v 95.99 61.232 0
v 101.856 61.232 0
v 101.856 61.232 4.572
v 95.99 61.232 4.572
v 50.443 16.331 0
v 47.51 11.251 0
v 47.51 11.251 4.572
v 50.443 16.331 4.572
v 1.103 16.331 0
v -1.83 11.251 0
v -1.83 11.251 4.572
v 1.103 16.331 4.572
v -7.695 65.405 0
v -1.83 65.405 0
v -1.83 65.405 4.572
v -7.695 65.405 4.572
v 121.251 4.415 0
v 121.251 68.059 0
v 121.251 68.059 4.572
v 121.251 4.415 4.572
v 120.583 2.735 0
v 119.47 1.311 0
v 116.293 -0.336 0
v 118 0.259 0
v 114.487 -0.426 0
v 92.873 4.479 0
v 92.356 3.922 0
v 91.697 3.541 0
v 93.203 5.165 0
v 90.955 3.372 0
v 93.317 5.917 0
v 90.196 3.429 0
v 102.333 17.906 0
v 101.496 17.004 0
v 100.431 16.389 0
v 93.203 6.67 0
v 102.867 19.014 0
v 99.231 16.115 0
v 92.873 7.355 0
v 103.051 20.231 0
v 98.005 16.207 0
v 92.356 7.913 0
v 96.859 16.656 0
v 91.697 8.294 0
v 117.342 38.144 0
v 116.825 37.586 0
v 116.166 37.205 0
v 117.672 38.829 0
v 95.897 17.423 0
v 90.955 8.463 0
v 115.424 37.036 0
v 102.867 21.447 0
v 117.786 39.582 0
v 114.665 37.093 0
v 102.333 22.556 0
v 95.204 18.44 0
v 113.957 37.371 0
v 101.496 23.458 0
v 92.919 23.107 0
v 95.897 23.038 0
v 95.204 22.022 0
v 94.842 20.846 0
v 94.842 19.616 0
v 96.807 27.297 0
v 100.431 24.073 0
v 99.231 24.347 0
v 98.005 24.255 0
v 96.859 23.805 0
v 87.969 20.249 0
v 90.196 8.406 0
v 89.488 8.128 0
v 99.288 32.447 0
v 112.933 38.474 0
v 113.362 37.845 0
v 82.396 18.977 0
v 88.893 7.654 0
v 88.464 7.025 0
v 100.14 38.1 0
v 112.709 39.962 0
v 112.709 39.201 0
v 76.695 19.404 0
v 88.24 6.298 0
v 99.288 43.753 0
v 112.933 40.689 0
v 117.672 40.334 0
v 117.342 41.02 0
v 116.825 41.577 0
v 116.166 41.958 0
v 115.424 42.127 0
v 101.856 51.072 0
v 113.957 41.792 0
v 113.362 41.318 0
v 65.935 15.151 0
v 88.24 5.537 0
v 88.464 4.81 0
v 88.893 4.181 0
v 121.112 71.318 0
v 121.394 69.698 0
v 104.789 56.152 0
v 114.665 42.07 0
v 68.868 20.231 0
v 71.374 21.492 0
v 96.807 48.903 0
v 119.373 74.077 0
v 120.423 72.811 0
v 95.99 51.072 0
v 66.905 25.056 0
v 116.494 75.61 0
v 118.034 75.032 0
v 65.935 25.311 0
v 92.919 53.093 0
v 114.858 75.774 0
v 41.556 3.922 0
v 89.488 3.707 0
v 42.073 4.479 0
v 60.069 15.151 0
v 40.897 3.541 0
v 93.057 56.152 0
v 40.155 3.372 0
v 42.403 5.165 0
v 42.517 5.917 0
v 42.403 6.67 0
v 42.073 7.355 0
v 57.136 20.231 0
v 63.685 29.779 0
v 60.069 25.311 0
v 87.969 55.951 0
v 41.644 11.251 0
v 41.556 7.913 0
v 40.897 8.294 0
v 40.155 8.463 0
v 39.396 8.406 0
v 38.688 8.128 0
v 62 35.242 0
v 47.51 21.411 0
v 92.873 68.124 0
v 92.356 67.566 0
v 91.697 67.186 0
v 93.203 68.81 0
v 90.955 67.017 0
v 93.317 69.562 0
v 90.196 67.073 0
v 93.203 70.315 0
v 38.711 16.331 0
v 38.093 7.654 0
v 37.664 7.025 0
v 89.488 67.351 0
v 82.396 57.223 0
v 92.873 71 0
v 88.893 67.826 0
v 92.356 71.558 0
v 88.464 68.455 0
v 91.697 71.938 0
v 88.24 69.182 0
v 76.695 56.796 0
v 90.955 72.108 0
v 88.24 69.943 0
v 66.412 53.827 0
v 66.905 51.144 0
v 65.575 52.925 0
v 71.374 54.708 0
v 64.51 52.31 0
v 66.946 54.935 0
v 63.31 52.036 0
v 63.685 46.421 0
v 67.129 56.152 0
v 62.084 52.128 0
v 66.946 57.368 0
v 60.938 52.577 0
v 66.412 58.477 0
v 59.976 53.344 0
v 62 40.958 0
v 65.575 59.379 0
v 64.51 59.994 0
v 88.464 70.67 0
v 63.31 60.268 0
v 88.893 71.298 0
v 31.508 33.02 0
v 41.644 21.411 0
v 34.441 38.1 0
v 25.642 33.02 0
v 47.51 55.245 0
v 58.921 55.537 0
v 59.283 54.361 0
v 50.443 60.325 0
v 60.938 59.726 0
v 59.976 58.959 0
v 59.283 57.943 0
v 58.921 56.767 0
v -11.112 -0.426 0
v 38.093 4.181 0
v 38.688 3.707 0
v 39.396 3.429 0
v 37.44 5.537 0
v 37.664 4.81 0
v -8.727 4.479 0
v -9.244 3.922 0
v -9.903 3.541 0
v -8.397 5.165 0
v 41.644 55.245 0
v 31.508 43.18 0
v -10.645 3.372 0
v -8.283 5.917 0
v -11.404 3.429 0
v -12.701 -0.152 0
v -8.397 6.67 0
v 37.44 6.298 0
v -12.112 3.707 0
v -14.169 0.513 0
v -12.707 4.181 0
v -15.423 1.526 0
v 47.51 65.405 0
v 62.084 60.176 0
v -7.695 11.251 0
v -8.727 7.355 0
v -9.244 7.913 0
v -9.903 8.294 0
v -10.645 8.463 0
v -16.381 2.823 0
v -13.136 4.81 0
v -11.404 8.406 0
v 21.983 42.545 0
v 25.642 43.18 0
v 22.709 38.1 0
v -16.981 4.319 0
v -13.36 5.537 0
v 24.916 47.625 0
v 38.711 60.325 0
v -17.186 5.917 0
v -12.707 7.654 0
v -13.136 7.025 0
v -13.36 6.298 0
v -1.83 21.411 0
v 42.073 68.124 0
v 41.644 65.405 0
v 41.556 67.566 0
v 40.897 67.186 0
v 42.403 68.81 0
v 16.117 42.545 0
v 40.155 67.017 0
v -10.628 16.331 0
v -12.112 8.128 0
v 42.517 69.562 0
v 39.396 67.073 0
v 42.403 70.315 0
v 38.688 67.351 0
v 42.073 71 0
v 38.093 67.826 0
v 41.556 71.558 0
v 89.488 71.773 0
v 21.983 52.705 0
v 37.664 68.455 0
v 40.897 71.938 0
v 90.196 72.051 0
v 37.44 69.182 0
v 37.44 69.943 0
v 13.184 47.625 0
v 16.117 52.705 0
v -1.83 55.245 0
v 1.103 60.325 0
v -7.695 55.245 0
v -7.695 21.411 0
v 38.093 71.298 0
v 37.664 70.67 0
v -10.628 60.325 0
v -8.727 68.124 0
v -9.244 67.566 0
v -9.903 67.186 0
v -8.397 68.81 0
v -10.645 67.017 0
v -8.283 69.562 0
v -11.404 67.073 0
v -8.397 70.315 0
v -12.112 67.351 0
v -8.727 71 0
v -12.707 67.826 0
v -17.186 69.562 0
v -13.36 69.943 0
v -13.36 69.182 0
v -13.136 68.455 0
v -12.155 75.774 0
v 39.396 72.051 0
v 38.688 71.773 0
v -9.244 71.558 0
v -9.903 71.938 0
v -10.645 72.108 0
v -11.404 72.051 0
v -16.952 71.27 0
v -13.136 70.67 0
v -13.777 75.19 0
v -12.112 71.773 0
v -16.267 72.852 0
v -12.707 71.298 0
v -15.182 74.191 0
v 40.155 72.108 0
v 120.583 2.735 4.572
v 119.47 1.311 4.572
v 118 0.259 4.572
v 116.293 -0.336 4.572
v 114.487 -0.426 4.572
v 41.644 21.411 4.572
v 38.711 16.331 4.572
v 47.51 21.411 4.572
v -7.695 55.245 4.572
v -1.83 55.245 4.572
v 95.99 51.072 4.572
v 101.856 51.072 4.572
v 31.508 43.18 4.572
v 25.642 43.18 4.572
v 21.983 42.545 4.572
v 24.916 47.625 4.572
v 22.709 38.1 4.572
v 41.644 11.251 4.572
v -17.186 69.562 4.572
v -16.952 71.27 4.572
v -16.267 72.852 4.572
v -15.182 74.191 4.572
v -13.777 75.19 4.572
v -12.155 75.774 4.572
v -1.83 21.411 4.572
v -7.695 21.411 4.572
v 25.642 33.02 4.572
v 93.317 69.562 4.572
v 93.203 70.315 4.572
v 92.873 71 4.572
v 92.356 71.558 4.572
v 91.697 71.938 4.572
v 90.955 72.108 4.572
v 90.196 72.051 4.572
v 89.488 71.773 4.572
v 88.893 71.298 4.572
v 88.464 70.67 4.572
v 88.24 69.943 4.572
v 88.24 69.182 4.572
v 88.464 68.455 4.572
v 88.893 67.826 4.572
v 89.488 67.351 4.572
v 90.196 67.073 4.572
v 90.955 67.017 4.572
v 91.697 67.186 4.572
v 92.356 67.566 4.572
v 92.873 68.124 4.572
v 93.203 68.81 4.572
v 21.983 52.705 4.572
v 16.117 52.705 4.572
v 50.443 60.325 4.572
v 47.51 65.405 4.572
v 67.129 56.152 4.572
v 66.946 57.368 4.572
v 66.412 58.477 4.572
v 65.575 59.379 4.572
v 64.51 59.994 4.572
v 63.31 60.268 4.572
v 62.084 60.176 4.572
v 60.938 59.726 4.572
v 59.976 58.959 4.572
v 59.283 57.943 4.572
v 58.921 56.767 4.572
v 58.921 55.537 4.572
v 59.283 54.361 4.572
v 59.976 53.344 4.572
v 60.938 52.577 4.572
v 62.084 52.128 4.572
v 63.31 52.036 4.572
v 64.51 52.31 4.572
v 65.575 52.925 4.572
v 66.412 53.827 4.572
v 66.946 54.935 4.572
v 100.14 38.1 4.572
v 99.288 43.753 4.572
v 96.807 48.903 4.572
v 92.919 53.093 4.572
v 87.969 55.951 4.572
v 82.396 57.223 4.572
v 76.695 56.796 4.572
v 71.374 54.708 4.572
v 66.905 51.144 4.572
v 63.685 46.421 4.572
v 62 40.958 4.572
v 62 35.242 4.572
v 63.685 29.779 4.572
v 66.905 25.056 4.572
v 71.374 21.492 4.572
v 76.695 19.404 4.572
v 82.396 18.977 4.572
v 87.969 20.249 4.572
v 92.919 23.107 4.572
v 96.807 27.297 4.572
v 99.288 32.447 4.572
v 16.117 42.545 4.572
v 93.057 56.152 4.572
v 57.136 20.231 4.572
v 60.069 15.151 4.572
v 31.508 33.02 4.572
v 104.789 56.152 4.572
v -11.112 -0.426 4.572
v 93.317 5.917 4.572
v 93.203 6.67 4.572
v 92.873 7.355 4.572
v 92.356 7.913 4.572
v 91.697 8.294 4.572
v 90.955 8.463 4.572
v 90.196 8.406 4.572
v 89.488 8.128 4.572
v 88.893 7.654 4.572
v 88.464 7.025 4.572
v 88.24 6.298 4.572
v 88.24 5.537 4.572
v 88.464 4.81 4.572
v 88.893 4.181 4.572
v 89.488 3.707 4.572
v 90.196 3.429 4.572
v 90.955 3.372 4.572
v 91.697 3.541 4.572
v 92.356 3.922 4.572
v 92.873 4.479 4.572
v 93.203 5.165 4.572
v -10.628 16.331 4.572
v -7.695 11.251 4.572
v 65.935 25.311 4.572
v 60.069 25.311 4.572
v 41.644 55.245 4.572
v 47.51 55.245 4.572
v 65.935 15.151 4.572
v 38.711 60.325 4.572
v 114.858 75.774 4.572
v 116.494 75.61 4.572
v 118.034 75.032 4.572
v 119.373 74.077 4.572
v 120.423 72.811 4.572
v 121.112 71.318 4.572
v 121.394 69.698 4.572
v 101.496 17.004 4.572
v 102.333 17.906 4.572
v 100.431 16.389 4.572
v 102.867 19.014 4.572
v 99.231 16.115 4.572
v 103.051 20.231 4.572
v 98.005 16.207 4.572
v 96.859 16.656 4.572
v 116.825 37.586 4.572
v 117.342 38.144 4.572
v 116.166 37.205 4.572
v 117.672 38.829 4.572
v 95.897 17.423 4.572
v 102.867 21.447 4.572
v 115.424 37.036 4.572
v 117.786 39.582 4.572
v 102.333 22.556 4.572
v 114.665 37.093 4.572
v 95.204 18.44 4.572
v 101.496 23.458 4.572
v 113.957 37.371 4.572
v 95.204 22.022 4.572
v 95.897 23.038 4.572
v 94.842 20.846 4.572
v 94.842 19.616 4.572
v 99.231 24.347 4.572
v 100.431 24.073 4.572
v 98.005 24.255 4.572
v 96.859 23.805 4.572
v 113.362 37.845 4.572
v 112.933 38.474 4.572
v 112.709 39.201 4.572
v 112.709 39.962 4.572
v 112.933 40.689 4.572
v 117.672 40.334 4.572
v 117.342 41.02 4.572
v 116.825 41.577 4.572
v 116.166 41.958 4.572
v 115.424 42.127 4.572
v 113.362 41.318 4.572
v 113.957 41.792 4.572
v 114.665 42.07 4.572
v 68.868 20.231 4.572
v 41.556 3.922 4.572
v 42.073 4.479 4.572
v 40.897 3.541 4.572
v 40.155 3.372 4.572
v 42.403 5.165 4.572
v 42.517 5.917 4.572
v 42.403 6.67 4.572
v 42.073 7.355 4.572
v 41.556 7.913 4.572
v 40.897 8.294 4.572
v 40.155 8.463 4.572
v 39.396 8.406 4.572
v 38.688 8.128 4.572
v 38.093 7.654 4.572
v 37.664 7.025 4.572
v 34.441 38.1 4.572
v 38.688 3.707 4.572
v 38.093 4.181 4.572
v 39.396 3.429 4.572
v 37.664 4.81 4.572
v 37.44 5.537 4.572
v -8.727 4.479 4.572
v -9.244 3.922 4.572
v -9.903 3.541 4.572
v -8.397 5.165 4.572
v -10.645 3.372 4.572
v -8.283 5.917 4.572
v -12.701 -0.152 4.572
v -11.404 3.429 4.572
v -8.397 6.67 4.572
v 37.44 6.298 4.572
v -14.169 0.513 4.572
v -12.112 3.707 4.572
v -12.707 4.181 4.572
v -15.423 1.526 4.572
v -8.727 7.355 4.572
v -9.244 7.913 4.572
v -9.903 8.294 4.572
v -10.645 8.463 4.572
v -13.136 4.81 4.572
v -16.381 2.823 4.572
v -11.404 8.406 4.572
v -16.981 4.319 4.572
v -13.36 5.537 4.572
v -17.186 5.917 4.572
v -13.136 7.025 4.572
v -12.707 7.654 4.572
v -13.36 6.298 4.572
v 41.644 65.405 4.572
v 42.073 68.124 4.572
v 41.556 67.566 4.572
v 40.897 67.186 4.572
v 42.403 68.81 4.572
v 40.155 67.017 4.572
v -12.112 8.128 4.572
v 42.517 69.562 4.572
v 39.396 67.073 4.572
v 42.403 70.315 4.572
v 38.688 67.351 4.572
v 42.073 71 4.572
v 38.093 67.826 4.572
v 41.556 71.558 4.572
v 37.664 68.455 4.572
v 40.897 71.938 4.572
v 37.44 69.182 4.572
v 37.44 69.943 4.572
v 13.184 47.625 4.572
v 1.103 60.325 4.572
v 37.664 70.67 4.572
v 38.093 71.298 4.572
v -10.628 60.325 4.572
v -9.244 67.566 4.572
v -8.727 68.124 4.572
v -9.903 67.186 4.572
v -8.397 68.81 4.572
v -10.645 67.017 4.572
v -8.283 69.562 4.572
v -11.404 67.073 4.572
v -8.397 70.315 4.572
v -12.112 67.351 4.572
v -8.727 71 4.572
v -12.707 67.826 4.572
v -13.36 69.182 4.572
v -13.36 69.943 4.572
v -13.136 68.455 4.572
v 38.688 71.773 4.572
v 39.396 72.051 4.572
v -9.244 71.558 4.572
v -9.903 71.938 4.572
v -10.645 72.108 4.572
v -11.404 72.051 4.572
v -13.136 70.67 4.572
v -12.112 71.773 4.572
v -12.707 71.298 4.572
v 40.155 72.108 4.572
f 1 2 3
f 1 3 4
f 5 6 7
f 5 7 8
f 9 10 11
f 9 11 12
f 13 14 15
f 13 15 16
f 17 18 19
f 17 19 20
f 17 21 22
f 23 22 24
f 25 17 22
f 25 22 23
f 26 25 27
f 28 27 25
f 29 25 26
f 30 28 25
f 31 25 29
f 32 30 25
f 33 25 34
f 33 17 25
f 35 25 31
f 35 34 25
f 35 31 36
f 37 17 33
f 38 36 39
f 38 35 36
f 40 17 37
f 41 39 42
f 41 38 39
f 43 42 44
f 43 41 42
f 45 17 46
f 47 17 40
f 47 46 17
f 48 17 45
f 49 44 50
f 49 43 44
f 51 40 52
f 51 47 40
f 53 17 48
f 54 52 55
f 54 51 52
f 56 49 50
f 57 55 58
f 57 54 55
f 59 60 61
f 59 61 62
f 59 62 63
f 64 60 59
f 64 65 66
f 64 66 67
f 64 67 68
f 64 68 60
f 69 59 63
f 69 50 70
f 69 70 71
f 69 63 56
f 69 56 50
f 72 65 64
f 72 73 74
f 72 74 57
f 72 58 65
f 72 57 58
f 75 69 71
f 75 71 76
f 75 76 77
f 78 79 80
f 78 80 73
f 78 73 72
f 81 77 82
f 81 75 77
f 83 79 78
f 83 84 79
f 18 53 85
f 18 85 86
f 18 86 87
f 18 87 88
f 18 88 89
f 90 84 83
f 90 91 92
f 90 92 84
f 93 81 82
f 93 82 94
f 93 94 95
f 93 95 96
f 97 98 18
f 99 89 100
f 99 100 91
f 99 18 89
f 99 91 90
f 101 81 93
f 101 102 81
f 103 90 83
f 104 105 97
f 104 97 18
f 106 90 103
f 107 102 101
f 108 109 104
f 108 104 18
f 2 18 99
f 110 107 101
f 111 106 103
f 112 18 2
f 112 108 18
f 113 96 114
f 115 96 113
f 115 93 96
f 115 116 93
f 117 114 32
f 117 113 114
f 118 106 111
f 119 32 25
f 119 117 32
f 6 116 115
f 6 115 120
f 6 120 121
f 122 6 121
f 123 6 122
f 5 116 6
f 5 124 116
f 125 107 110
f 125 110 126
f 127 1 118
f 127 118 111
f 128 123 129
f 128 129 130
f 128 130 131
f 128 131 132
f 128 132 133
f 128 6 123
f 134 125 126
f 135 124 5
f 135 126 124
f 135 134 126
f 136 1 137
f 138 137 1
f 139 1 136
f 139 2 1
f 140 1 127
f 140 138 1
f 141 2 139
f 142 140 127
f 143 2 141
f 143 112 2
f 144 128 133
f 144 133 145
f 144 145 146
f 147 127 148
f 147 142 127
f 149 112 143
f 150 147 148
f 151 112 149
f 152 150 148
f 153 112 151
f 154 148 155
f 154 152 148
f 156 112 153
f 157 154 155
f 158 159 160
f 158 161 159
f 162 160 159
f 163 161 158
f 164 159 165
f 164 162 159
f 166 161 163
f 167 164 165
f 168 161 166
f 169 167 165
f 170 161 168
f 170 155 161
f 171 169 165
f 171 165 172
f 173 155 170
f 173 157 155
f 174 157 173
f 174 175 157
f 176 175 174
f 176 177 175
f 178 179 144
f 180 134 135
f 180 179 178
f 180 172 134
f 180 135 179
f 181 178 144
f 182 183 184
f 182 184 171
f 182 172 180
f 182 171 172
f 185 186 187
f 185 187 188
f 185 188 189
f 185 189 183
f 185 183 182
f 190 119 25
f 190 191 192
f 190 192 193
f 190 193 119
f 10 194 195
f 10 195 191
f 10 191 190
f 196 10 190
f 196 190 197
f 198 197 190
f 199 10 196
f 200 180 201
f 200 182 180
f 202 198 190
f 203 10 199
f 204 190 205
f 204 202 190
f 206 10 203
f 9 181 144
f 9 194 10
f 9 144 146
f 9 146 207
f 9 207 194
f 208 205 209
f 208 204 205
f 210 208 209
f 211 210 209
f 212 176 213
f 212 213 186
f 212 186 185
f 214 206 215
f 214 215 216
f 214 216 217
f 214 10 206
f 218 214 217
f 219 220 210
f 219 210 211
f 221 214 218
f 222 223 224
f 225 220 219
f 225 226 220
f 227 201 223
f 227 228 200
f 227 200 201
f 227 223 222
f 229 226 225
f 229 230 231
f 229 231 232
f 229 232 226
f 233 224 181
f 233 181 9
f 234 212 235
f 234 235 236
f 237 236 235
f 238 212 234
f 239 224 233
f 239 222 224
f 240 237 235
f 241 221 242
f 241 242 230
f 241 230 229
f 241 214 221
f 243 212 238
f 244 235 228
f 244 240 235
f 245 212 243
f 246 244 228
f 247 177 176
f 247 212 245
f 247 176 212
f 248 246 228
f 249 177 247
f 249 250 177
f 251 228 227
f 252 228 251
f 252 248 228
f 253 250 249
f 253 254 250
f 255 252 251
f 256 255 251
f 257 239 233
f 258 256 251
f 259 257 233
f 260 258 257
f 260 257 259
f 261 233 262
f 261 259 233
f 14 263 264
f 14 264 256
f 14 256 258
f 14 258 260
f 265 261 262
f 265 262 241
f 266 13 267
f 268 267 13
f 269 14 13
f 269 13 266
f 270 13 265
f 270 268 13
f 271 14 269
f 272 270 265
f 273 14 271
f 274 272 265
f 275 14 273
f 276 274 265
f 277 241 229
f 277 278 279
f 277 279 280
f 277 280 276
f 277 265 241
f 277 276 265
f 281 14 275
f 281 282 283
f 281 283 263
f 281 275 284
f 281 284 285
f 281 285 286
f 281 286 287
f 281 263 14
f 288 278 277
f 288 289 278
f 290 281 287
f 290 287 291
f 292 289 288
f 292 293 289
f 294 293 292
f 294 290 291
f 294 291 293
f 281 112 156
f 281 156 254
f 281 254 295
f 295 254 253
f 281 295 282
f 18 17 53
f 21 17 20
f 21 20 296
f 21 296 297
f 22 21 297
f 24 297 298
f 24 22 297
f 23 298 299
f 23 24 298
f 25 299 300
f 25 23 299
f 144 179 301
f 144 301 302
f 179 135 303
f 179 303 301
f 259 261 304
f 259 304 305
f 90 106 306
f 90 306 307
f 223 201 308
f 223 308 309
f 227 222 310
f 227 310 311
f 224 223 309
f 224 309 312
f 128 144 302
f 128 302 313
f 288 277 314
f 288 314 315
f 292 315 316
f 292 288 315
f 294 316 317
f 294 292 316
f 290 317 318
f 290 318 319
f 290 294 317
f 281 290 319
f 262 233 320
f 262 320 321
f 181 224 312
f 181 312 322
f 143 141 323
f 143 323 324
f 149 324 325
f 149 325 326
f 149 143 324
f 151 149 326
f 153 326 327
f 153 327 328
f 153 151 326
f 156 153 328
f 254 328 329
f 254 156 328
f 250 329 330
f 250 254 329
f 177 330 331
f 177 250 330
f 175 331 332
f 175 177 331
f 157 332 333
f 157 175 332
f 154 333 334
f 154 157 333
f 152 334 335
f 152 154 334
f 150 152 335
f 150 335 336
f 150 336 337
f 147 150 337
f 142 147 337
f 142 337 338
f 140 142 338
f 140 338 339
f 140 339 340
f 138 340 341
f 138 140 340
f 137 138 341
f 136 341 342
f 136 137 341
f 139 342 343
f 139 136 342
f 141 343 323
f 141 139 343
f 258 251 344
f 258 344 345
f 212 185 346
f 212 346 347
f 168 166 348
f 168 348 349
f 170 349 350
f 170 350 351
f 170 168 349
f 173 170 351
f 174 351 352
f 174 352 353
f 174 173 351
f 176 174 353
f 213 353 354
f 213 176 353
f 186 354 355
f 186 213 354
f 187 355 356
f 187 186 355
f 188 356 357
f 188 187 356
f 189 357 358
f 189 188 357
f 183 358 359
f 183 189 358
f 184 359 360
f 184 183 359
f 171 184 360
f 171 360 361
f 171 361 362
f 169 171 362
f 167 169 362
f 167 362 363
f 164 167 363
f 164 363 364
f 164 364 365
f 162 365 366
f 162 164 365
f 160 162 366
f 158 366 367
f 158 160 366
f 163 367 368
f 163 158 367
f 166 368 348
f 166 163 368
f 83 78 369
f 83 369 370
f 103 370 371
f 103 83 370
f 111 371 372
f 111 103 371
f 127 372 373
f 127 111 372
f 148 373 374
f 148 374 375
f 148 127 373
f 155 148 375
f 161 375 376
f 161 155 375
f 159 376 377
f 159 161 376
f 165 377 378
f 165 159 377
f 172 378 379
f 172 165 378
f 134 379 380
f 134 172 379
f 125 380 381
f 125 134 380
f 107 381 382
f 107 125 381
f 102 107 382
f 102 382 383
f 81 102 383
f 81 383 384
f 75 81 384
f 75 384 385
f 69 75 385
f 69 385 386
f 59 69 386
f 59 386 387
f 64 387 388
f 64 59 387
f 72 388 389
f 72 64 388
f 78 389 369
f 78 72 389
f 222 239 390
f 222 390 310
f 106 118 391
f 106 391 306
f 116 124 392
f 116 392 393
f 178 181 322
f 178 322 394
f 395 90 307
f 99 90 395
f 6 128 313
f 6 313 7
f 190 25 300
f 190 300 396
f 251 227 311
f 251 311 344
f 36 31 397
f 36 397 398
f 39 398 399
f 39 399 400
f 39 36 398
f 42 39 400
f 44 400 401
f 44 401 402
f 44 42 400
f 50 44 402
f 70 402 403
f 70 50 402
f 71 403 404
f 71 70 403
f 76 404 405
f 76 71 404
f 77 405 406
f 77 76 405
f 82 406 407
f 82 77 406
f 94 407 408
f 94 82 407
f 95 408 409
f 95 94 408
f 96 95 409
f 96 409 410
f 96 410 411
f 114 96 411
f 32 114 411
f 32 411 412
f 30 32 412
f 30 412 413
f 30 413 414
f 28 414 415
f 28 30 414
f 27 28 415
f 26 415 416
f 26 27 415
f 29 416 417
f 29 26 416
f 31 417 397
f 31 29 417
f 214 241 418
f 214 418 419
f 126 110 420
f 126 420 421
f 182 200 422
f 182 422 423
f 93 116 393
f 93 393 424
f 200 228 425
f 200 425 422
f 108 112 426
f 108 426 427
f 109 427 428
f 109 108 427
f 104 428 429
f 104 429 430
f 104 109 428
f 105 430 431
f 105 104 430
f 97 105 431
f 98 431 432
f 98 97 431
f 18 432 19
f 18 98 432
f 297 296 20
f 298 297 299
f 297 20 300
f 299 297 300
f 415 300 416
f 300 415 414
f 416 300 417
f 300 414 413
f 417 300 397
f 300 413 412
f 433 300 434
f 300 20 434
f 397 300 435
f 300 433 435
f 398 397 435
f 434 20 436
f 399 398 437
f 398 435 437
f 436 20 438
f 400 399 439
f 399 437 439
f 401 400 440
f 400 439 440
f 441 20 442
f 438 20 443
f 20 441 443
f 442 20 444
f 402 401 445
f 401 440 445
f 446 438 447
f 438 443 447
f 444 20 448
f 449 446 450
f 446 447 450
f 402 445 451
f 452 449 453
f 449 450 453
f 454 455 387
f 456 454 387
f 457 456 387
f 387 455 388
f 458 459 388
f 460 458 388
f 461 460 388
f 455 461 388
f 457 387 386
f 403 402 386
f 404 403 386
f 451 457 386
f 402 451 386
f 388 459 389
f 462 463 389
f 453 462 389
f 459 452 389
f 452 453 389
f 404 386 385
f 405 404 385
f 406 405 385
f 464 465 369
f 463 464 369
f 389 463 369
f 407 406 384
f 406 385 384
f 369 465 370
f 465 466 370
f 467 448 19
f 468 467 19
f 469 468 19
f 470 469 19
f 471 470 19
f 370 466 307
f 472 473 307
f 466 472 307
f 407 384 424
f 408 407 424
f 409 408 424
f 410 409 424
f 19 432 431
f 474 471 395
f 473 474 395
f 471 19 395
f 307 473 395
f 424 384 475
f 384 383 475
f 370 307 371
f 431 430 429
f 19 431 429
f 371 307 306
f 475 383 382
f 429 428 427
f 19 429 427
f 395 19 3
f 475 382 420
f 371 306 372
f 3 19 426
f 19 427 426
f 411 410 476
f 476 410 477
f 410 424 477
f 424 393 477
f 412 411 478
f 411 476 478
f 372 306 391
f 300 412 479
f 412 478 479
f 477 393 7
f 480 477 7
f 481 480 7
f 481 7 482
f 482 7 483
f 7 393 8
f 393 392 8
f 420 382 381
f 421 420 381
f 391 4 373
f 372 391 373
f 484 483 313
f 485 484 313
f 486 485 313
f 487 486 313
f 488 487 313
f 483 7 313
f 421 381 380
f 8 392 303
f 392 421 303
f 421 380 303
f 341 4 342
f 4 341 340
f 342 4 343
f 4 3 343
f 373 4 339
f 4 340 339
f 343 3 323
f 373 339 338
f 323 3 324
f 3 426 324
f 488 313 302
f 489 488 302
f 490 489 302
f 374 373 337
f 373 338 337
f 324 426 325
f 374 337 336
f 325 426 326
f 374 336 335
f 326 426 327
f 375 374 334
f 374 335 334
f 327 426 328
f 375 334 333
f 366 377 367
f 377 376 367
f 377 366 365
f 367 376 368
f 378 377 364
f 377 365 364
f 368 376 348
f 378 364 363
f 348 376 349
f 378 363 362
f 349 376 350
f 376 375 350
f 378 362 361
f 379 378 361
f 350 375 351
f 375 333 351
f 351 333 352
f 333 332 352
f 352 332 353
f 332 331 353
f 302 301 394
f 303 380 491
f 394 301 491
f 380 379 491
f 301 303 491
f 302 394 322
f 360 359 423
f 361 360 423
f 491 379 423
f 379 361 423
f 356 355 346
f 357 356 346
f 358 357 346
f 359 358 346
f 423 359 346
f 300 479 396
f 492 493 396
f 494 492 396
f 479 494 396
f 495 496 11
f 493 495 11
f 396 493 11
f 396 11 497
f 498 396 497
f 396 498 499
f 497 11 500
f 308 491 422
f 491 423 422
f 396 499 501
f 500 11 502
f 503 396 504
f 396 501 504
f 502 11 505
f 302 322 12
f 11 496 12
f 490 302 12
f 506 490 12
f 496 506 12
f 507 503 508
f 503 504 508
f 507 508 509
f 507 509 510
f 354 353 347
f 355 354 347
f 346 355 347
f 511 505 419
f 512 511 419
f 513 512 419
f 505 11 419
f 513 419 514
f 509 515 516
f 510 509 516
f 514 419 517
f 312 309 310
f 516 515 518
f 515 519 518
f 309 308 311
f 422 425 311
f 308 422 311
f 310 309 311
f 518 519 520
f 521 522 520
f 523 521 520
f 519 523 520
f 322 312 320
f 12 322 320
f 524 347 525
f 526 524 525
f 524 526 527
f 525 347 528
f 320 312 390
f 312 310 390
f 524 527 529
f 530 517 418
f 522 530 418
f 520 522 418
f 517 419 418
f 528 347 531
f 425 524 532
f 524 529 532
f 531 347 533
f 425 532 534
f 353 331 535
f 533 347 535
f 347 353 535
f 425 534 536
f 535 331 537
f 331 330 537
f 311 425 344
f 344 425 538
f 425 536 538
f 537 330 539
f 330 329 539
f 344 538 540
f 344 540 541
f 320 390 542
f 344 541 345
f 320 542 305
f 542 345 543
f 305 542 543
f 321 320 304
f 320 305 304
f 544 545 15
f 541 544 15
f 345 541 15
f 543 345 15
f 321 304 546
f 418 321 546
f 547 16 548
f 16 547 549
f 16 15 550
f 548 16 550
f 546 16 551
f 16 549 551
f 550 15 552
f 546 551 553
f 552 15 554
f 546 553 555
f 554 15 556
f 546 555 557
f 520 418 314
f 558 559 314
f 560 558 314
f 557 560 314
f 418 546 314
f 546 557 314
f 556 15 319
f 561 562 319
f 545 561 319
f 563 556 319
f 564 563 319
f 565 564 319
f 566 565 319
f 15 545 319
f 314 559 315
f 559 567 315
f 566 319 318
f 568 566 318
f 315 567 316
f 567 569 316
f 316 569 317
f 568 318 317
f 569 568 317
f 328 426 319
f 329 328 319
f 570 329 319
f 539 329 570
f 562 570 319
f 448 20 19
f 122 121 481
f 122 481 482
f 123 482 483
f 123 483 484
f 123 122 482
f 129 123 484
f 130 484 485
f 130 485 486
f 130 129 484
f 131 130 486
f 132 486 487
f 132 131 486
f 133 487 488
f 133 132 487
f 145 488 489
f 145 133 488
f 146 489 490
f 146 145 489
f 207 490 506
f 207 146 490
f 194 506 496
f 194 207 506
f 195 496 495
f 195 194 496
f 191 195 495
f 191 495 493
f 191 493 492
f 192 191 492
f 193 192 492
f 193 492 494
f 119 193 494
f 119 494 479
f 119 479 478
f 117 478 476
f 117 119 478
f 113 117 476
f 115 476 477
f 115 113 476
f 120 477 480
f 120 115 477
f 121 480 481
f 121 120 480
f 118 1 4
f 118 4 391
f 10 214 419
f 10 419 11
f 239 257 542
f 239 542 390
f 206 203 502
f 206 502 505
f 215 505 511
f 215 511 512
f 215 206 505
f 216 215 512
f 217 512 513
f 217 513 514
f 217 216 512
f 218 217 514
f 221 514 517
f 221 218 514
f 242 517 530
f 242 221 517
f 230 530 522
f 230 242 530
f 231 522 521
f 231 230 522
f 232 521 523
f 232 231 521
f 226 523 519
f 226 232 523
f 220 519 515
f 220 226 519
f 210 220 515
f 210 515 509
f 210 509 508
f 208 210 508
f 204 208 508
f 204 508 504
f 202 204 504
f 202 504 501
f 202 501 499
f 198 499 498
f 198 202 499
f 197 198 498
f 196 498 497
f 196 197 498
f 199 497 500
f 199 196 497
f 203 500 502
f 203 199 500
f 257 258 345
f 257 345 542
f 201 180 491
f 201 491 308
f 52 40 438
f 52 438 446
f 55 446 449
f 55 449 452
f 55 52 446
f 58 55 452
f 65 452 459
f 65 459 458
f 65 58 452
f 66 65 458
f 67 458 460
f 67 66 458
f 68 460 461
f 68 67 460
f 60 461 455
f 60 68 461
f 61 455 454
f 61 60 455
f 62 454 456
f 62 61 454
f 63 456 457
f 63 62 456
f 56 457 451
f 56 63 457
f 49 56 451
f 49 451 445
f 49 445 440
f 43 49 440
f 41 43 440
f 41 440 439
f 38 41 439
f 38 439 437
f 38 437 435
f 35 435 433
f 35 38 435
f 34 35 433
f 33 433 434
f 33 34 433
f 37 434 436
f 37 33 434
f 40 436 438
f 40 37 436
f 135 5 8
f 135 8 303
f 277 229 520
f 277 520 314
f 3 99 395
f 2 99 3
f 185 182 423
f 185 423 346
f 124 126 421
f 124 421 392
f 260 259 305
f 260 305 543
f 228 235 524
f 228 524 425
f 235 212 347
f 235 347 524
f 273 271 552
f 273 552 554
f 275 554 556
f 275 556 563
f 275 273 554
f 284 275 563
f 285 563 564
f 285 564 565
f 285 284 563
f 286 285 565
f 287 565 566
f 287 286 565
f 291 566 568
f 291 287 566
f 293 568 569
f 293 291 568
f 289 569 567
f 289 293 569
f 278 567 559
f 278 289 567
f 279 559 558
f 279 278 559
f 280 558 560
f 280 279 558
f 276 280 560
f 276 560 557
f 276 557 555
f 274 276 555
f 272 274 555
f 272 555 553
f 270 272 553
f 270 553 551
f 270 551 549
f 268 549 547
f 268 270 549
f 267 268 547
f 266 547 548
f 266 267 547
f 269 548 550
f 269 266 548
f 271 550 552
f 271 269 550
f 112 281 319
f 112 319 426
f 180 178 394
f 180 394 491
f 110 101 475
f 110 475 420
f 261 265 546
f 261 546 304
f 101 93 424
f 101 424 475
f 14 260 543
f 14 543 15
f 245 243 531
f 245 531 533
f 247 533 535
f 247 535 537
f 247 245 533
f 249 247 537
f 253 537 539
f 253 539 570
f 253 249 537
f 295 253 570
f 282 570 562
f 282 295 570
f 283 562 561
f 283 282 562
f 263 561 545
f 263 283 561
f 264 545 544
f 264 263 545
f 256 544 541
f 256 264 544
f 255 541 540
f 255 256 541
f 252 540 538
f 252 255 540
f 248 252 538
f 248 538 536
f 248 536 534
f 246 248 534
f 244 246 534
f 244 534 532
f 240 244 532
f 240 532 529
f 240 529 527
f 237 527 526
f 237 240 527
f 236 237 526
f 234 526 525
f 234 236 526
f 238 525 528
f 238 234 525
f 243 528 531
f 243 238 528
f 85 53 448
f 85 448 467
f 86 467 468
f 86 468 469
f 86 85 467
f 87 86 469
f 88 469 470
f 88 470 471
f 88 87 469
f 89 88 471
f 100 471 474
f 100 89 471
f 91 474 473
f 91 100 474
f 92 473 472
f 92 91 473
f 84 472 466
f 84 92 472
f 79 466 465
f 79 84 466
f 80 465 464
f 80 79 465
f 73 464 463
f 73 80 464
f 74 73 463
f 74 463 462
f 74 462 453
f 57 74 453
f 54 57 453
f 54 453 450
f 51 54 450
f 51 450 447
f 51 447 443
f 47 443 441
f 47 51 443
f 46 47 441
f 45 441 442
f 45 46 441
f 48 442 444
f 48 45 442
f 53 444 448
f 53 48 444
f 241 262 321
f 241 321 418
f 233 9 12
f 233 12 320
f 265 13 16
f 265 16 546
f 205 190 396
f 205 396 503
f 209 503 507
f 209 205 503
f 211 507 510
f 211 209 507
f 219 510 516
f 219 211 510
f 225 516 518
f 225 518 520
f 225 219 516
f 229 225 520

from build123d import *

# Parameters (mm, degrees)
SKETCH1_R           = 2.5527
SKETCH1_R_2         = 4.1275
SKETCH1_R_3         = 19.177
BOSS_EXTRUDE1_DEPTH = 4.572


with BuildPart() as part:
    # Sketch1 → Boss-Extrude1 (new body)
    with BuildSketch(Plane.XY):
        with BuildLine():
            Line((-17.186005785, 5.917481167), (-17.186005785, 69.562080021))
            ThreePointArc((-17.186005785, 69.562080021), (-15.770600509, 73.558612882), (-12.155368019, 75.773503633))
            Line((-12.155368019, 75.773503633), (114.857780393, 75.773503633))
            ThreePointArc((114.857780393, 75.773503633), (119.939137204, 73.478410267), (121.251078966, 68.059328295))
            Line((121.251078966, 68.059328295), (121.251078966, 4.414729441))
            ThreePointArc((121.251078966, 4.414729441), (118.772241914, 0.732566989), (114.487440215, -0.426496367))
            Line((114.487440215, -0.426496367), (-11.1125, -0.426496367))
            ThreePointArc((-11.1125, -0.426496367), (-15.422847741, 1.526196519), (-17.186005785, 5.917481167))
        make_face()
        with Locations((90.763994215, 5.917481167)):
            Circle(SKETCH1_R, mode=Mode.SUBTRACT)
        with Locations((90.763994215, 69.562080021)):
            Circle(SKETCH1_R, mode=Mode.SUBTRACT)
        with Locations((-10.836005785, 69.562080021)):
            Circle(SKETCH1_R, mode=Mode.SUBTRACT)
        with Locations((39.963994215, 69.562080021)):
            Circle(SKETCH1_R, mode=Mode.SUBTRACT)
        with Locations((-10.836005785, 5.917481167)):
            Circle(SKETCH1_R, mode=Mode.SUBTRACT)
        with Locations((39.963994215, 5.917481167)):
            Circle(SKETCH1_R, mode=Mode.SUBTRACT)
        with Locations((63.001987758, 56.151789166)):
            Circle(SKETCH1_R_2, mode=Mode.SUBTRACT)
        with Locations((115.233146458, 39.581556975)):
            Circle(SKETCH1_R, mode=Mode.SUBTRACT)
        with Locations((98.923012242, 20.230764682)):
            Circle(SKETCH1_R_2, mode=Mode.SUBTRACT)
        with Locations((80.9625, 38.1)):
            Circle(SKETCH1_R_3, mode=Mode.SUBTRACT)
        Polygon((1.103378735, 60.325), (-1.829560633, 65.405), (-7.695439367, 65.405), (-10.628378735, 60.325), (-7.695439367, 55.245), (-1.829560633, 55.245), align=None, mode=Mode.SUBTRACT)
        Polygon((50.443227049, 60.325), (47.510287682, 65.405), (41.644408947, 65.405), (38.71146958, 60.325), (41.644408947, 55.245), (47.510287682, 55.245), align=None, mode=Mode.SUBTRACT)
        Polygon((1.103378735, 16.331279268), (-1.829560633, 21.411279268), (-7.695439367, 21.411279268), (-10.628378735, 16.331279268), (-7.695439367, 11.251279268), (-1.829560633, 11.251279268), align=None, mode=Mode.SUBTRACT)
        Polygon((50.443227049, 16.331279268), (47.510287682, 21.411279268), (41.644408947, 21.411279268), (38.71146958, 16.331279268), (41.644408947, 11.251279268), (47.510287682, 11.251279268), align=None, mode=Mode.SUBTRACT)
        Polygon((68.867866493, 20.230764682), (65.934927125, 25.310764682), (60.06904839, 25.310764682), (57.136109023, 20.230764682), (60.06904839, 15.150764682), (65.934927125, 15.150764682), align=None, mode=Mode.SUBTRACT)
        Polygon((104.788890977, 56.151789166), (101.85595161, 61.231789166), (95.990072875, 61.231789166), (93.057133507, 56.151789166), (95.990072875, 51.071789166), (101.85595161, 51.071789166), align=None, mode=Mode.SUBTRACT)
        Polygon((24.915878735, 47.625), (21.982939367, 52.705), (16.117060633, 52.705), (13.184121265, 47.625), (16.117060633, 42.545), (21.982939367, 42.545), align=None, mode=Mode.SUBTRACT)
        Polygon((34.440878735, 38.1), (31.507939367, 43.18), (25.642060633, 43.18), (22.709121265, 38.1), (25.642060633, 33.02), (31.507939367, 33.02), align=None, mode=Mode.SUBTRACT)
    extrude(amount=BOSS_EXTRUDE1_DEPTH)


solid = part.part
